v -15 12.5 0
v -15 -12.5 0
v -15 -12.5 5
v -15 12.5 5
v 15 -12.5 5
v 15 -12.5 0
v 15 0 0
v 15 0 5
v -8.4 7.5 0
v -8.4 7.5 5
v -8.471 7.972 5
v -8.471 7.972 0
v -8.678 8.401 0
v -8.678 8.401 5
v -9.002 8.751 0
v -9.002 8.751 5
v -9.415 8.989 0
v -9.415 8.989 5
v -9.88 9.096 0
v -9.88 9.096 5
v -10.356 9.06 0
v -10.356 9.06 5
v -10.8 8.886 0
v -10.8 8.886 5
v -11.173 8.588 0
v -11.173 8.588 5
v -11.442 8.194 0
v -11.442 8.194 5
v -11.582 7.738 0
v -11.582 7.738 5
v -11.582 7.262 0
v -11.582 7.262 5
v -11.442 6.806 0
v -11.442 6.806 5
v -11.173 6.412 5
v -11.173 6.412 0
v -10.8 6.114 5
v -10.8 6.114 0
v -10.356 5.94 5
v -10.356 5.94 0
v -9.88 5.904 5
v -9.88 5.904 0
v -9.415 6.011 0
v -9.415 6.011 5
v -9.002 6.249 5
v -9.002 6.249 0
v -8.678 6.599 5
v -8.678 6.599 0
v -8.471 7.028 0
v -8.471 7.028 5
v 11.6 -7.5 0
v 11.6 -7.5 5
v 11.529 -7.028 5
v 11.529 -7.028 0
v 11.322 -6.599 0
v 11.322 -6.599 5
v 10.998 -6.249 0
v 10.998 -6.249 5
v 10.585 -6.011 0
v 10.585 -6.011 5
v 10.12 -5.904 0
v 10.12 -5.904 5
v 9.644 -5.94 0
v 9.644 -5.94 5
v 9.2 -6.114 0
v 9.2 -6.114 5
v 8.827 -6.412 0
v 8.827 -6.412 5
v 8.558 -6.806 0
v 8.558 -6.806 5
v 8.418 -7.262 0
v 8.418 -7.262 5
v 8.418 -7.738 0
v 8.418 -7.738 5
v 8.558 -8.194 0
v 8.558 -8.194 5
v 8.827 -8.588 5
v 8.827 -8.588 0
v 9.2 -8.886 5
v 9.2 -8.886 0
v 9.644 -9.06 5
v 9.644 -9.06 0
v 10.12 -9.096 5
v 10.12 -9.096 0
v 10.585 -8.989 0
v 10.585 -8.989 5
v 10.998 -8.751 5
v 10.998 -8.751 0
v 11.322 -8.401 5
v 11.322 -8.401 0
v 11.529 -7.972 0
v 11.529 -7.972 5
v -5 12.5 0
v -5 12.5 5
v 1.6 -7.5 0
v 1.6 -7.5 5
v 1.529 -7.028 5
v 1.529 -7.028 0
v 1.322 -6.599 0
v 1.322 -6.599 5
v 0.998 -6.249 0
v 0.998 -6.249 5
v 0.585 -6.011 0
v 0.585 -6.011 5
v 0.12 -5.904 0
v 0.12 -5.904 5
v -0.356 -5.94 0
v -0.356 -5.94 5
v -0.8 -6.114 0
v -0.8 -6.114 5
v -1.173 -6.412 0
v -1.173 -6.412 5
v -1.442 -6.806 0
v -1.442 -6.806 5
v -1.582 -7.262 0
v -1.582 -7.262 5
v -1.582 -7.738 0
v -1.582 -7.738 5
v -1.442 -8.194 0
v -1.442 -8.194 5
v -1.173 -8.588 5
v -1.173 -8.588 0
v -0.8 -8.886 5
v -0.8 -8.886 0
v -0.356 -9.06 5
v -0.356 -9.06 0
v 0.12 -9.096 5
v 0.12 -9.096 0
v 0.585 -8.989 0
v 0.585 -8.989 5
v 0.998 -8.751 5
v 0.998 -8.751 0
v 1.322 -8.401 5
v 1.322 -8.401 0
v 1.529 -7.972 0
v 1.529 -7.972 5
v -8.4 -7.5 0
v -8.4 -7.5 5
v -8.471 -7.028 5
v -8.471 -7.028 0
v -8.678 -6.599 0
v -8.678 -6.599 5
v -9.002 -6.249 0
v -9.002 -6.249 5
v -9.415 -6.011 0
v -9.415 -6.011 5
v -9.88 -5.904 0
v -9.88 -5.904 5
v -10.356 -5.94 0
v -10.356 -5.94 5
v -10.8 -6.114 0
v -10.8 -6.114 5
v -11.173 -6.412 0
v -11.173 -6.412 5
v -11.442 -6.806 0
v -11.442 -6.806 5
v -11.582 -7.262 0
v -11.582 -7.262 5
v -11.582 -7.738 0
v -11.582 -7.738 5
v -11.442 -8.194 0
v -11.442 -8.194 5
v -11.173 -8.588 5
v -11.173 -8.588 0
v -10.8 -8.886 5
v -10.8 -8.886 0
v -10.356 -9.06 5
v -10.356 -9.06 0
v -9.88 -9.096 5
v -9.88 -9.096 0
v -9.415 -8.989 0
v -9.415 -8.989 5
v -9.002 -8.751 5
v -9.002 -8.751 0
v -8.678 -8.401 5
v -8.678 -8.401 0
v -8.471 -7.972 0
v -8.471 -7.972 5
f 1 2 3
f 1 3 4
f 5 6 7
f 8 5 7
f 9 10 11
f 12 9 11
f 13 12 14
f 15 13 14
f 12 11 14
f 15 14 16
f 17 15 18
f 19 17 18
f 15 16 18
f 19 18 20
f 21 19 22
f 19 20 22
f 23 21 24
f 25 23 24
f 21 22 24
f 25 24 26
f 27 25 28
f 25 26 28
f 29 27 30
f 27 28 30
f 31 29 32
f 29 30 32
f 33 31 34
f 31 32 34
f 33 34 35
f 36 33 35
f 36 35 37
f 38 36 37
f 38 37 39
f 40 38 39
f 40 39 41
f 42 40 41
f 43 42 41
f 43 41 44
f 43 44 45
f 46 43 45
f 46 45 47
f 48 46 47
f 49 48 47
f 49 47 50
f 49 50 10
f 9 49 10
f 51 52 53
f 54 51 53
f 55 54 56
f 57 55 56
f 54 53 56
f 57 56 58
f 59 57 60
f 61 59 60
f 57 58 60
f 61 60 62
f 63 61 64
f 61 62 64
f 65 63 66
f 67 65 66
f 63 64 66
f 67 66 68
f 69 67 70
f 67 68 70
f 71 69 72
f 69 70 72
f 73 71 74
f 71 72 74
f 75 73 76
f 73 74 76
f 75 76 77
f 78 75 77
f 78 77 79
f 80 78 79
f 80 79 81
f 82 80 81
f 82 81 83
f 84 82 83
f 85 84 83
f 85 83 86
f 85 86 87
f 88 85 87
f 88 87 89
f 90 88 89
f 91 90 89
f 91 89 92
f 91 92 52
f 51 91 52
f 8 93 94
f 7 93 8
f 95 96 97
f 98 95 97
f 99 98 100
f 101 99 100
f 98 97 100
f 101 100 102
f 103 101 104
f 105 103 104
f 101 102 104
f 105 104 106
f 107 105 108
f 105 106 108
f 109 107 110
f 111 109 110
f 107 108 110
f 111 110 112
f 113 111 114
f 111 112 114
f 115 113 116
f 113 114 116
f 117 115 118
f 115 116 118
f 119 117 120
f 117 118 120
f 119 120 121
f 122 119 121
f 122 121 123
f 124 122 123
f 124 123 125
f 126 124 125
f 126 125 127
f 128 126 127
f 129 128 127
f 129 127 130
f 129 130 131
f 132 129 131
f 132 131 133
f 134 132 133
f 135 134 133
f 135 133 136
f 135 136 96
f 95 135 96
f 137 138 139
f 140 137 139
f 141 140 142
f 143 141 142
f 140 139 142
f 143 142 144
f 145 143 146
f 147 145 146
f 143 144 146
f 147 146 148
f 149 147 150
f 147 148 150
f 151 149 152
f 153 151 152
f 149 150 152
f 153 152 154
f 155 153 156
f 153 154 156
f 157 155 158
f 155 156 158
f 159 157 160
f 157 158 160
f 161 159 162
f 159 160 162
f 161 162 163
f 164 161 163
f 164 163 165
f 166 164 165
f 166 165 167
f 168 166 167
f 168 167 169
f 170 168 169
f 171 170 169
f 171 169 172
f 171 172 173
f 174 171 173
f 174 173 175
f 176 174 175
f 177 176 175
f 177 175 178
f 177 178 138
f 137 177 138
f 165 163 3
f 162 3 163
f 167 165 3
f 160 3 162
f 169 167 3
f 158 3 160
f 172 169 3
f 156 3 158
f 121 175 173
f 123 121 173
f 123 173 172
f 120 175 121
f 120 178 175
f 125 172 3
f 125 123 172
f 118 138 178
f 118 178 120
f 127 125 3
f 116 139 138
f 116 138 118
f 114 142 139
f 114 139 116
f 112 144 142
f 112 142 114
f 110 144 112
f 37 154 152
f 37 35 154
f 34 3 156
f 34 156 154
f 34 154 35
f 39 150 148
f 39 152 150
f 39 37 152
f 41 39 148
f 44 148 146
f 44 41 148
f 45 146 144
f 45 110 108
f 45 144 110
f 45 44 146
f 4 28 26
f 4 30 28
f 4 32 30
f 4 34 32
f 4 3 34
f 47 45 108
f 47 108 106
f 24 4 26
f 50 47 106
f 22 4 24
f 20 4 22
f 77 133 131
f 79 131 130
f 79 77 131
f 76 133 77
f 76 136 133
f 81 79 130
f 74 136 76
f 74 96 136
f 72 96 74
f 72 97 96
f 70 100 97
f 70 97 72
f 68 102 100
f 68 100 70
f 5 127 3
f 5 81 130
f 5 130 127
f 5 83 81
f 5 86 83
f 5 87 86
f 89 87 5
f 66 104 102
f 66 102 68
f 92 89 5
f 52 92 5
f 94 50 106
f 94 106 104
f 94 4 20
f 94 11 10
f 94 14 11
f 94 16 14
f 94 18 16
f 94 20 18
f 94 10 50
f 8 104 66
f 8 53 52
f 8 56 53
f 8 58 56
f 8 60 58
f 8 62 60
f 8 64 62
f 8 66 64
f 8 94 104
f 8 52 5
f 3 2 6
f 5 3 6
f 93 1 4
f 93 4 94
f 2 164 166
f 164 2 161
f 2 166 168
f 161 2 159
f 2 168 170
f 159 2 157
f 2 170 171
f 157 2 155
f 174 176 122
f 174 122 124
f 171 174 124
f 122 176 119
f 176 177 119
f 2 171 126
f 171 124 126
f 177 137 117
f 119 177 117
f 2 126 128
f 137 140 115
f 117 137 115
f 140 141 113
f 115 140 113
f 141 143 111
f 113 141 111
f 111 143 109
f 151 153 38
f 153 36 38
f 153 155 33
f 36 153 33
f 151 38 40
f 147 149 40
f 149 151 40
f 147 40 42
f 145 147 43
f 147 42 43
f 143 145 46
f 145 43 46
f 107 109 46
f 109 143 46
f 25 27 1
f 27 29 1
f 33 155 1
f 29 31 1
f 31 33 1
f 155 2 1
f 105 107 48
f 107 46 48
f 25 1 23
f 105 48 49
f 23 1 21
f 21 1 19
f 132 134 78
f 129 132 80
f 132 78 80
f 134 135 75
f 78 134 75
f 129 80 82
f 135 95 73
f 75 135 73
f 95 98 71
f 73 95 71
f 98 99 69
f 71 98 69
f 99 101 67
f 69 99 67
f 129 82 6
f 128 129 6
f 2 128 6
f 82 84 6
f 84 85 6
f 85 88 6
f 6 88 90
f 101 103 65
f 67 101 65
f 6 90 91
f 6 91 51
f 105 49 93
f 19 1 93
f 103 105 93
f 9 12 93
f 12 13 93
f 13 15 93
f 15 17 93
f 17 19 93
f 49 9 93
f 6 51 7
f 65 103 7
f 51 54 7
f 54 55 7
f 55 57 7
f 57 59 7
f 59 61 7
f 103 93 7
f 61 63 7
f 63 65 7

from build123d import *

# Parameters (mm, degrees)
SKETCH1_W               = 30
SKETCH1_H               = 25
BOSS_EXTRUDE1_DEPTH     = 5
CUT_EXTRUDE1_REACH      = 22.156
SKETCH2_R               = 1.6
CUT_EXTRUDE2_DEPTH      = 21.155644371
CUT_EXTRUDE2_DEPTH_BACK = 5


with BuildPart() as part:
    # Sketch1 → Boss-Extrude1 (new body)
    with BuildSketch(Plane.XY):
        Rectangle(SKETCH1_W, SKETCH1_H)
    extrude(amount=BOSS_EXTRUDE1_DEPTH)

    # Sketch2 → Cut-Extrude1 (cut, up to next)
    with BuildSketch(Plane.XY.offset(5), mode=Mode.PRIVATE) as cut_extrude1_sk1:
        with Locations((-10, -7.5)):
            Circle(SKETCH2_R)
    cut_extrude1_tool1 = extrude(cut_extrude1_sk1.sketch, amount=-CUT_EXTRUDE1_REACH, mode=Mode.PRIVATE) & part.part
    # Sketch2 → Cut-Extrude1 (cut, up to next)
    with BuildSketch(Plane.XY.offset(5), mode=Mode.PRIVATE) as cut_extrude1_sk2:
        with Locations((0, -7.5)):
            Circle(SKETCH2_R)
    cut_extrude1_tool2 = extrude(cut_extrude1_sk2.sketch, amount=-CUT_EXTRUDE1_REACH, mode=Mode.PRIVATE) & part.part
    # Sketch2 → Cut-Extrude1 (cut, up to next)
    with BuildSketch(Plane.XY.offset(5), mode=Mode.PRIVATE) as cut_extrude1_sk3:
        with Locations((10, -7.5)):
            Circle(SKETCH2_R)
    cut_extrude1_tool3 = extrude(cut_extrude1_sk3.sketch, amount=-CUT_EXTRUDE1_REACH, mode=Mode.PRIVATE) & part.part
    # Sketch2 → Cut-Extrude1 (cut, up to next)
    with BuildSketch(Plane.XY.offset(5), mode=Mode.PRIVATE) as cut_extrude1_sk4:
        with Locations((-10, 7.5)):
            Circle(SKETCH2_R)
    cut_extrude1_tool4 = extrude(cut_extrude1_sk4.sketch, amount=-CUT_EXTRUDE1_REACH, mode=Mode.PRIVATE) & part.part
    add(cut_extrude1_tool1.solids().sort_by_distance((-10, -7.5, 5))[0], mode=Mode.SUBTRACT)
    add(cut_extrude1_tool2.solids().sort_by_distance((0, -7.5, 5))[0], mode=Mode.SUBTRACT)
    add(cut_extrude1_tool3.solids().sort_by_distance((10, -7.5, 5))[0], mode=Mode.SUBTRACT)
    add(cut_extrude1_tool4.solids().sort_by_distance((-10, 7.5, 5))[0], mode=Mode.SUBTRACT)

    # Sketch3 → Cut-Extrude2 (cut, two sides: drawn at the far end of the back side and taken through both)
    with BuildSketch(Plane.XY.offset(5).offset(-CUT_EXTRUDE2_DEPTH_BACK)):
        Polygon((-68.5998728, 52.2499205), (-5, 12.5), (15, 0), (78.5998728, -39.7499205), (158.099713801, 87.449825101), (10.8999682, 179.449666101), align=None)
    extrude(amount=CUT_EXTRUDE2_DEPTH + CUT_EXTRUDE2_DEPTH_BACK, mode=Mode.SUBTRACT)


solid = part.part
